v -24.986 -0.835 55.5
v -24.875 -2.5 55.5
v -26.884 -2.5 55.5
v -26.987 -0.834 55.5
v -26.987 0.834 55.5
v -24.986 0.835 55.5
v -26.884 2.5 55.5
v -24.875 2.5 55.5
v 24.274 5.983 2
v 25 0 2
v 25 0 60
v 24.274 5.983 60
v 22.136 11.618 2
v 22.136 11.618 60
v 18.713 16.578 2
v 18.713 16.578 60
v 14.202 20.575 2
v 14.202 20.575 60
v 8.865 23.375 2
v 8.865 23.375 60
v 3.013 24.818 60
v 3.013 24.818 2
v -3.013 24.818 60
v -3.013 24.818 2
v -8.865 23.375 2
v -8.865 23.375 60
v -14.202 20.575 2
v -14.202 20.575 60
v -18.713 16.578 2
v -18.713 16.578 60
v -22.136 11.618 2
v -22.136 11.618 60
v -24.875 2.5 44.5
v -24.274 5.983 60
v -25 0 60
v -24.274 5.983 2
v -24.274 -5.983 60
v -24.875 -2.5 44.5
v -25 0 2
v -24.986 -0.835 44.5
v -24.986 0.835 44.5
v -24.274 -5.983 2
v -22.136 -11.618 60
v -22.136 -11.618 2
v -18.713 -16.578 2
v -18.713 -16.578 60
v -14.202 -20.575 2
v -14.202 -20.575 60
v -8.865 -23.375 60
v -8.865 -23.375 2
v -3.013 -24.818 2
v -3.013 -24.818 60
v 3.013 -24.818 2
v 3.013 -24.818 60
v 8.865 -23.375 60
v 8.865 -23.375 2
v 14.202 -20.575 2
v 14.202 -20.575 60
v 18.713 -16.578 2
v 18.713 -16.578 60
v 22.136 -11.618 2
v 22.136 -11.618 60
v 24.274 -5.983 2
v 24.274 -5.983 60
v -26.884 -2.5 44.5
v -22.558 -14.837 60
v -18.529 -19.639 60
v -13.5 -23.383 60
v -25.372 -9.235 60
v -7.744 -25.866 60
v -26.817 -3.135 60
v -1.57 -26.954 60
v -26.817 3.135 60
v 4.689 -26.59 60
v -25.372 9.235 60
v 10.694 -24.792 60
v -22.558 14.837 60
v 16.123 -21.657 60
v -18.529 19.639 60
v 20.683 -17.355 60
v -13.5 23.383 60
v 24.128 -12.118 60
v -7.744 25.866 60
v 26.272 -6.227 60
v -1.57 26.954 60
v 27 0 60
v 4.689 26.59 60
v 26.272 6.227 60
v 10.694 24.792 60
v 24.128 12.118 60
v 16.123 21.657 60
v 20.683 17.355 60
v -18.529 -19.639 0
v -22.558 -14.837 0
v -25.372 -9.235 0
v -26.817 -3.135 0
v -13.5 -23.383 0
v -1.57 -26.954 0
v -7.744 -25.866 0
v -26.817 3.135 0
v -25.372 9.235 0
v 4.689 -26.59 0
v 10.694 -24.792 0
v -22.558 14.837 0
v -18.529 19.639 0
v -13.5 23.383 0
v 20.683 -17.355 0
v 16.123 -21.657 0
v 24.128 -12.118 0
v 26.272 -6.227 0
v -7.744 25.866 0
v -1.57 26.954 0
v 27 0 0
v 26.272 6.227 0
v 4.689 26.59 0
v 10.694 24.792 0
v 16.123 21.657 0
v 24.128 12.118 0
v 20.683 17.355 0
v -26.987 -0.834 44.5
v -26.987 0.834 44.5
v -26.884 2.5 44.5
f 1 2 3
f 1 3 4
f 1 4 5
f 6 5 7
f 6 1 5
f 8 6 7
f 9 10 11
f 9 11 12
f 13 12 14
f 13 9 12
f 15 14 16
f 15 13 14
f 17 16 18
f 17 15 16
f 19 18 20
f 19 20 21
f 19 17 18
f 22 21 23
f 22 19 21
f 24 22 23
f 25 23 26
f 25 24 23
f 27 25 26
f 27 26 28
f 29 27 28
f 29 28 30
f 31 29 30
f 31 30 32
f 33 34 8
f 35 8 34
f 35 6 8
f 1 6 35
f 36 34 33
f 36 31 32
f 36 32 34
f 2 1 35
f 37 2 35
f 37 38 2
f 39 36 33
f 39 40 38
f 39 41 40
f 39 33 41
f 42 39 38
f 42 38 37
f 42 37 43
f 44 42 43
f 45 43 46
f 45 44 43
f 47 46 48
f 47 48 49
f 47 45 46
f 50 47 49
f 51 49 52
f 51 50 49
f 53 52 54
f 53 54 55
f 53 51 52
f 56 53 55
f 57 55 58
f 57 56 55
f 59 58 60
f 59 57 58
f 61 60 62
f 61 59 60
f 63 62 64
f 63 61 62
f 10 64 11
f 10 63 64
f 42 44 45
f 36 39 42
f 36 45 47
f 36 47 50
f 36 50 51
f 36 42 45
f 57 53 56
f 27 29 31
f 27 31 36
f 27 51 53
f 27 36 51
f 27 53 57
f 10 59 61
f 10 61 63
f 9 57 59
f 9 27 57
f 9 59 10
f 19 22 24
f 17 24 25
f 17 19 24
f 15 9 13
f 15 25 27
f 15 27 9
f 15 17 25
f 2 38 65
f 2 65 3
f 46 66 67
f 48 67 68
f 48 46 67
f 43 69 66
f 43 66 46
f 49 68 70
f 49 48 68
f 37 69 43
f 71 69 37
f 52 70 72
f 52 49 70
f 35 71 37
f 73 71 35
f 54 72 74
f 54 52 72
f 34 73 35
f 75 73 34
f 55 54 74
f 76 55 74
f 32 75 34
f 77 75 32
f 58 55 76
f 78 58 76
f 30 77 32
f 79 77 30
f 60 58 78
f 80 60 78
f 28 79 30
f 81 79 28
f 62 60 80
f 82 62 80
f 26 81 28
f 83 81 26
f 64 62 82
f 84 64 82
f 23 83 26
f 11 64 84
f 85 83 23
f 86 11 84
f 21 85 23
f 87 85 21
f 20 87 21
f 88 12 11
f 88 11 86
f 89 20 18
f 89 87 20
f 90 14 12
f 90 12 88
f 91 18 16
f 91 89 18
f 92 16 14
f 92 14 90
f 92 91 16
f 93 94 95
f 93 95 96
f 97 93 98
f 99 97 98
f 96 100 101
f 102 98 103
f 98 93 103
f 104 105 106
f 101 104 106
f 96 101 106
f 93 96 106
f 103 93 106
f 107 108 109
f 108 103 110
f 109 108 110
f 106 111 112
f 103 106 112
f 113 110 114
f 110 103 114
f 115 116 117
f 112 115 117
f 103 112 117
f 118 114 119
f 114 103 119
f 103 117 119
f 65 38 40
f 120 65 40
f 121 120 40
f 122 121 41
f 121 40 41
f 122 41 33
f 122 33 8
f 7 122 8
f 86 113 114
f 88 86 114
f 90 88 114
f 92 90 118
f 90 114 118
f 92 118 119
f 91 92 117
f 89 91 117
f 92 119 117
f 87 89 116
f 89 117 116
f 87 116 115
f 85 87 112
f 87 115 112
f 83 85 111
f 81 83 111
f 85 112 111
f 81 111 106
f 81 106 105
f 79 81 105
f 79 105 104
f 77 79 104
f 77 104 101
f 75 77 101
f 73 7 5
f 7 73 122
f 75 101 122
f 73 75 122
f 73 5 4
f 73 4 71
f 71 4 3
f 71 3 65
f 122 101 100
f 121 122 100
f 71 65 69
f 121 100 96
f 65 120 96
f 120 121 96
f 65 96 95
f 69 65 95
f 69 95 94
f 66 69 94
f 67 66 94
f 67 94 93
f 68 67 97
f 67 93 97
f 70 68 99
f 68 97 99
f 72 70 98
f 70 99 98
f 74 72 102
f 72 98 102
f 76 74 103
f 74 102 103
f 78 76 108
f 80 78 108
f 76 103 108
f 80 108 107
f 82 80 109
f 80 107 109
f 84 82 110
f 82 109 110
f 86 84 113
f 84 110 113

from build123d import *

# Parameters (mm, degrees)
F0_R     = 27
F0_R_2   = 25
F1_DEPTH = 60
F2_W     = 5
F2_H     = 11
F3_DEPTH = 25
F4_DEPTH = 30
F5_DEPTH = 2


with BuildPart() as f1:
    # F0 (on Top) → F1 (new body)
    with BuildSketch(Plane.XY):
        Circle(F0_R)
        Circle(F0_R_2, mode=Mode.SUBTRACT)
    extrude(amount=F1_DEPTH)

    # F2 (on Right) → F3 (cut)
    with BuildSketch(Plane.YZ):
        with Locations((0, 50)):
            Rectangle(F2_W, F2_H)
    extrude(amount=-F3_DEPTH, mode=Mode.SUBTRACT)

    # F2 (on Right) → F4 (cut)
    with BuildSketch(Plane.YZ):
        with Locations((0, 50)):
            Rectangle(F2_W, F2_H)
    extrude(amount=-F4_DEPTH, mode=Mode.SUBTRACT)

    # F0 (on Top) → F5 (join)
    with BuildSketch(Plane.XY):
        Circle(F0_R_2)
    extrude(amount=F5_DEPTH)


solid = f1.part
